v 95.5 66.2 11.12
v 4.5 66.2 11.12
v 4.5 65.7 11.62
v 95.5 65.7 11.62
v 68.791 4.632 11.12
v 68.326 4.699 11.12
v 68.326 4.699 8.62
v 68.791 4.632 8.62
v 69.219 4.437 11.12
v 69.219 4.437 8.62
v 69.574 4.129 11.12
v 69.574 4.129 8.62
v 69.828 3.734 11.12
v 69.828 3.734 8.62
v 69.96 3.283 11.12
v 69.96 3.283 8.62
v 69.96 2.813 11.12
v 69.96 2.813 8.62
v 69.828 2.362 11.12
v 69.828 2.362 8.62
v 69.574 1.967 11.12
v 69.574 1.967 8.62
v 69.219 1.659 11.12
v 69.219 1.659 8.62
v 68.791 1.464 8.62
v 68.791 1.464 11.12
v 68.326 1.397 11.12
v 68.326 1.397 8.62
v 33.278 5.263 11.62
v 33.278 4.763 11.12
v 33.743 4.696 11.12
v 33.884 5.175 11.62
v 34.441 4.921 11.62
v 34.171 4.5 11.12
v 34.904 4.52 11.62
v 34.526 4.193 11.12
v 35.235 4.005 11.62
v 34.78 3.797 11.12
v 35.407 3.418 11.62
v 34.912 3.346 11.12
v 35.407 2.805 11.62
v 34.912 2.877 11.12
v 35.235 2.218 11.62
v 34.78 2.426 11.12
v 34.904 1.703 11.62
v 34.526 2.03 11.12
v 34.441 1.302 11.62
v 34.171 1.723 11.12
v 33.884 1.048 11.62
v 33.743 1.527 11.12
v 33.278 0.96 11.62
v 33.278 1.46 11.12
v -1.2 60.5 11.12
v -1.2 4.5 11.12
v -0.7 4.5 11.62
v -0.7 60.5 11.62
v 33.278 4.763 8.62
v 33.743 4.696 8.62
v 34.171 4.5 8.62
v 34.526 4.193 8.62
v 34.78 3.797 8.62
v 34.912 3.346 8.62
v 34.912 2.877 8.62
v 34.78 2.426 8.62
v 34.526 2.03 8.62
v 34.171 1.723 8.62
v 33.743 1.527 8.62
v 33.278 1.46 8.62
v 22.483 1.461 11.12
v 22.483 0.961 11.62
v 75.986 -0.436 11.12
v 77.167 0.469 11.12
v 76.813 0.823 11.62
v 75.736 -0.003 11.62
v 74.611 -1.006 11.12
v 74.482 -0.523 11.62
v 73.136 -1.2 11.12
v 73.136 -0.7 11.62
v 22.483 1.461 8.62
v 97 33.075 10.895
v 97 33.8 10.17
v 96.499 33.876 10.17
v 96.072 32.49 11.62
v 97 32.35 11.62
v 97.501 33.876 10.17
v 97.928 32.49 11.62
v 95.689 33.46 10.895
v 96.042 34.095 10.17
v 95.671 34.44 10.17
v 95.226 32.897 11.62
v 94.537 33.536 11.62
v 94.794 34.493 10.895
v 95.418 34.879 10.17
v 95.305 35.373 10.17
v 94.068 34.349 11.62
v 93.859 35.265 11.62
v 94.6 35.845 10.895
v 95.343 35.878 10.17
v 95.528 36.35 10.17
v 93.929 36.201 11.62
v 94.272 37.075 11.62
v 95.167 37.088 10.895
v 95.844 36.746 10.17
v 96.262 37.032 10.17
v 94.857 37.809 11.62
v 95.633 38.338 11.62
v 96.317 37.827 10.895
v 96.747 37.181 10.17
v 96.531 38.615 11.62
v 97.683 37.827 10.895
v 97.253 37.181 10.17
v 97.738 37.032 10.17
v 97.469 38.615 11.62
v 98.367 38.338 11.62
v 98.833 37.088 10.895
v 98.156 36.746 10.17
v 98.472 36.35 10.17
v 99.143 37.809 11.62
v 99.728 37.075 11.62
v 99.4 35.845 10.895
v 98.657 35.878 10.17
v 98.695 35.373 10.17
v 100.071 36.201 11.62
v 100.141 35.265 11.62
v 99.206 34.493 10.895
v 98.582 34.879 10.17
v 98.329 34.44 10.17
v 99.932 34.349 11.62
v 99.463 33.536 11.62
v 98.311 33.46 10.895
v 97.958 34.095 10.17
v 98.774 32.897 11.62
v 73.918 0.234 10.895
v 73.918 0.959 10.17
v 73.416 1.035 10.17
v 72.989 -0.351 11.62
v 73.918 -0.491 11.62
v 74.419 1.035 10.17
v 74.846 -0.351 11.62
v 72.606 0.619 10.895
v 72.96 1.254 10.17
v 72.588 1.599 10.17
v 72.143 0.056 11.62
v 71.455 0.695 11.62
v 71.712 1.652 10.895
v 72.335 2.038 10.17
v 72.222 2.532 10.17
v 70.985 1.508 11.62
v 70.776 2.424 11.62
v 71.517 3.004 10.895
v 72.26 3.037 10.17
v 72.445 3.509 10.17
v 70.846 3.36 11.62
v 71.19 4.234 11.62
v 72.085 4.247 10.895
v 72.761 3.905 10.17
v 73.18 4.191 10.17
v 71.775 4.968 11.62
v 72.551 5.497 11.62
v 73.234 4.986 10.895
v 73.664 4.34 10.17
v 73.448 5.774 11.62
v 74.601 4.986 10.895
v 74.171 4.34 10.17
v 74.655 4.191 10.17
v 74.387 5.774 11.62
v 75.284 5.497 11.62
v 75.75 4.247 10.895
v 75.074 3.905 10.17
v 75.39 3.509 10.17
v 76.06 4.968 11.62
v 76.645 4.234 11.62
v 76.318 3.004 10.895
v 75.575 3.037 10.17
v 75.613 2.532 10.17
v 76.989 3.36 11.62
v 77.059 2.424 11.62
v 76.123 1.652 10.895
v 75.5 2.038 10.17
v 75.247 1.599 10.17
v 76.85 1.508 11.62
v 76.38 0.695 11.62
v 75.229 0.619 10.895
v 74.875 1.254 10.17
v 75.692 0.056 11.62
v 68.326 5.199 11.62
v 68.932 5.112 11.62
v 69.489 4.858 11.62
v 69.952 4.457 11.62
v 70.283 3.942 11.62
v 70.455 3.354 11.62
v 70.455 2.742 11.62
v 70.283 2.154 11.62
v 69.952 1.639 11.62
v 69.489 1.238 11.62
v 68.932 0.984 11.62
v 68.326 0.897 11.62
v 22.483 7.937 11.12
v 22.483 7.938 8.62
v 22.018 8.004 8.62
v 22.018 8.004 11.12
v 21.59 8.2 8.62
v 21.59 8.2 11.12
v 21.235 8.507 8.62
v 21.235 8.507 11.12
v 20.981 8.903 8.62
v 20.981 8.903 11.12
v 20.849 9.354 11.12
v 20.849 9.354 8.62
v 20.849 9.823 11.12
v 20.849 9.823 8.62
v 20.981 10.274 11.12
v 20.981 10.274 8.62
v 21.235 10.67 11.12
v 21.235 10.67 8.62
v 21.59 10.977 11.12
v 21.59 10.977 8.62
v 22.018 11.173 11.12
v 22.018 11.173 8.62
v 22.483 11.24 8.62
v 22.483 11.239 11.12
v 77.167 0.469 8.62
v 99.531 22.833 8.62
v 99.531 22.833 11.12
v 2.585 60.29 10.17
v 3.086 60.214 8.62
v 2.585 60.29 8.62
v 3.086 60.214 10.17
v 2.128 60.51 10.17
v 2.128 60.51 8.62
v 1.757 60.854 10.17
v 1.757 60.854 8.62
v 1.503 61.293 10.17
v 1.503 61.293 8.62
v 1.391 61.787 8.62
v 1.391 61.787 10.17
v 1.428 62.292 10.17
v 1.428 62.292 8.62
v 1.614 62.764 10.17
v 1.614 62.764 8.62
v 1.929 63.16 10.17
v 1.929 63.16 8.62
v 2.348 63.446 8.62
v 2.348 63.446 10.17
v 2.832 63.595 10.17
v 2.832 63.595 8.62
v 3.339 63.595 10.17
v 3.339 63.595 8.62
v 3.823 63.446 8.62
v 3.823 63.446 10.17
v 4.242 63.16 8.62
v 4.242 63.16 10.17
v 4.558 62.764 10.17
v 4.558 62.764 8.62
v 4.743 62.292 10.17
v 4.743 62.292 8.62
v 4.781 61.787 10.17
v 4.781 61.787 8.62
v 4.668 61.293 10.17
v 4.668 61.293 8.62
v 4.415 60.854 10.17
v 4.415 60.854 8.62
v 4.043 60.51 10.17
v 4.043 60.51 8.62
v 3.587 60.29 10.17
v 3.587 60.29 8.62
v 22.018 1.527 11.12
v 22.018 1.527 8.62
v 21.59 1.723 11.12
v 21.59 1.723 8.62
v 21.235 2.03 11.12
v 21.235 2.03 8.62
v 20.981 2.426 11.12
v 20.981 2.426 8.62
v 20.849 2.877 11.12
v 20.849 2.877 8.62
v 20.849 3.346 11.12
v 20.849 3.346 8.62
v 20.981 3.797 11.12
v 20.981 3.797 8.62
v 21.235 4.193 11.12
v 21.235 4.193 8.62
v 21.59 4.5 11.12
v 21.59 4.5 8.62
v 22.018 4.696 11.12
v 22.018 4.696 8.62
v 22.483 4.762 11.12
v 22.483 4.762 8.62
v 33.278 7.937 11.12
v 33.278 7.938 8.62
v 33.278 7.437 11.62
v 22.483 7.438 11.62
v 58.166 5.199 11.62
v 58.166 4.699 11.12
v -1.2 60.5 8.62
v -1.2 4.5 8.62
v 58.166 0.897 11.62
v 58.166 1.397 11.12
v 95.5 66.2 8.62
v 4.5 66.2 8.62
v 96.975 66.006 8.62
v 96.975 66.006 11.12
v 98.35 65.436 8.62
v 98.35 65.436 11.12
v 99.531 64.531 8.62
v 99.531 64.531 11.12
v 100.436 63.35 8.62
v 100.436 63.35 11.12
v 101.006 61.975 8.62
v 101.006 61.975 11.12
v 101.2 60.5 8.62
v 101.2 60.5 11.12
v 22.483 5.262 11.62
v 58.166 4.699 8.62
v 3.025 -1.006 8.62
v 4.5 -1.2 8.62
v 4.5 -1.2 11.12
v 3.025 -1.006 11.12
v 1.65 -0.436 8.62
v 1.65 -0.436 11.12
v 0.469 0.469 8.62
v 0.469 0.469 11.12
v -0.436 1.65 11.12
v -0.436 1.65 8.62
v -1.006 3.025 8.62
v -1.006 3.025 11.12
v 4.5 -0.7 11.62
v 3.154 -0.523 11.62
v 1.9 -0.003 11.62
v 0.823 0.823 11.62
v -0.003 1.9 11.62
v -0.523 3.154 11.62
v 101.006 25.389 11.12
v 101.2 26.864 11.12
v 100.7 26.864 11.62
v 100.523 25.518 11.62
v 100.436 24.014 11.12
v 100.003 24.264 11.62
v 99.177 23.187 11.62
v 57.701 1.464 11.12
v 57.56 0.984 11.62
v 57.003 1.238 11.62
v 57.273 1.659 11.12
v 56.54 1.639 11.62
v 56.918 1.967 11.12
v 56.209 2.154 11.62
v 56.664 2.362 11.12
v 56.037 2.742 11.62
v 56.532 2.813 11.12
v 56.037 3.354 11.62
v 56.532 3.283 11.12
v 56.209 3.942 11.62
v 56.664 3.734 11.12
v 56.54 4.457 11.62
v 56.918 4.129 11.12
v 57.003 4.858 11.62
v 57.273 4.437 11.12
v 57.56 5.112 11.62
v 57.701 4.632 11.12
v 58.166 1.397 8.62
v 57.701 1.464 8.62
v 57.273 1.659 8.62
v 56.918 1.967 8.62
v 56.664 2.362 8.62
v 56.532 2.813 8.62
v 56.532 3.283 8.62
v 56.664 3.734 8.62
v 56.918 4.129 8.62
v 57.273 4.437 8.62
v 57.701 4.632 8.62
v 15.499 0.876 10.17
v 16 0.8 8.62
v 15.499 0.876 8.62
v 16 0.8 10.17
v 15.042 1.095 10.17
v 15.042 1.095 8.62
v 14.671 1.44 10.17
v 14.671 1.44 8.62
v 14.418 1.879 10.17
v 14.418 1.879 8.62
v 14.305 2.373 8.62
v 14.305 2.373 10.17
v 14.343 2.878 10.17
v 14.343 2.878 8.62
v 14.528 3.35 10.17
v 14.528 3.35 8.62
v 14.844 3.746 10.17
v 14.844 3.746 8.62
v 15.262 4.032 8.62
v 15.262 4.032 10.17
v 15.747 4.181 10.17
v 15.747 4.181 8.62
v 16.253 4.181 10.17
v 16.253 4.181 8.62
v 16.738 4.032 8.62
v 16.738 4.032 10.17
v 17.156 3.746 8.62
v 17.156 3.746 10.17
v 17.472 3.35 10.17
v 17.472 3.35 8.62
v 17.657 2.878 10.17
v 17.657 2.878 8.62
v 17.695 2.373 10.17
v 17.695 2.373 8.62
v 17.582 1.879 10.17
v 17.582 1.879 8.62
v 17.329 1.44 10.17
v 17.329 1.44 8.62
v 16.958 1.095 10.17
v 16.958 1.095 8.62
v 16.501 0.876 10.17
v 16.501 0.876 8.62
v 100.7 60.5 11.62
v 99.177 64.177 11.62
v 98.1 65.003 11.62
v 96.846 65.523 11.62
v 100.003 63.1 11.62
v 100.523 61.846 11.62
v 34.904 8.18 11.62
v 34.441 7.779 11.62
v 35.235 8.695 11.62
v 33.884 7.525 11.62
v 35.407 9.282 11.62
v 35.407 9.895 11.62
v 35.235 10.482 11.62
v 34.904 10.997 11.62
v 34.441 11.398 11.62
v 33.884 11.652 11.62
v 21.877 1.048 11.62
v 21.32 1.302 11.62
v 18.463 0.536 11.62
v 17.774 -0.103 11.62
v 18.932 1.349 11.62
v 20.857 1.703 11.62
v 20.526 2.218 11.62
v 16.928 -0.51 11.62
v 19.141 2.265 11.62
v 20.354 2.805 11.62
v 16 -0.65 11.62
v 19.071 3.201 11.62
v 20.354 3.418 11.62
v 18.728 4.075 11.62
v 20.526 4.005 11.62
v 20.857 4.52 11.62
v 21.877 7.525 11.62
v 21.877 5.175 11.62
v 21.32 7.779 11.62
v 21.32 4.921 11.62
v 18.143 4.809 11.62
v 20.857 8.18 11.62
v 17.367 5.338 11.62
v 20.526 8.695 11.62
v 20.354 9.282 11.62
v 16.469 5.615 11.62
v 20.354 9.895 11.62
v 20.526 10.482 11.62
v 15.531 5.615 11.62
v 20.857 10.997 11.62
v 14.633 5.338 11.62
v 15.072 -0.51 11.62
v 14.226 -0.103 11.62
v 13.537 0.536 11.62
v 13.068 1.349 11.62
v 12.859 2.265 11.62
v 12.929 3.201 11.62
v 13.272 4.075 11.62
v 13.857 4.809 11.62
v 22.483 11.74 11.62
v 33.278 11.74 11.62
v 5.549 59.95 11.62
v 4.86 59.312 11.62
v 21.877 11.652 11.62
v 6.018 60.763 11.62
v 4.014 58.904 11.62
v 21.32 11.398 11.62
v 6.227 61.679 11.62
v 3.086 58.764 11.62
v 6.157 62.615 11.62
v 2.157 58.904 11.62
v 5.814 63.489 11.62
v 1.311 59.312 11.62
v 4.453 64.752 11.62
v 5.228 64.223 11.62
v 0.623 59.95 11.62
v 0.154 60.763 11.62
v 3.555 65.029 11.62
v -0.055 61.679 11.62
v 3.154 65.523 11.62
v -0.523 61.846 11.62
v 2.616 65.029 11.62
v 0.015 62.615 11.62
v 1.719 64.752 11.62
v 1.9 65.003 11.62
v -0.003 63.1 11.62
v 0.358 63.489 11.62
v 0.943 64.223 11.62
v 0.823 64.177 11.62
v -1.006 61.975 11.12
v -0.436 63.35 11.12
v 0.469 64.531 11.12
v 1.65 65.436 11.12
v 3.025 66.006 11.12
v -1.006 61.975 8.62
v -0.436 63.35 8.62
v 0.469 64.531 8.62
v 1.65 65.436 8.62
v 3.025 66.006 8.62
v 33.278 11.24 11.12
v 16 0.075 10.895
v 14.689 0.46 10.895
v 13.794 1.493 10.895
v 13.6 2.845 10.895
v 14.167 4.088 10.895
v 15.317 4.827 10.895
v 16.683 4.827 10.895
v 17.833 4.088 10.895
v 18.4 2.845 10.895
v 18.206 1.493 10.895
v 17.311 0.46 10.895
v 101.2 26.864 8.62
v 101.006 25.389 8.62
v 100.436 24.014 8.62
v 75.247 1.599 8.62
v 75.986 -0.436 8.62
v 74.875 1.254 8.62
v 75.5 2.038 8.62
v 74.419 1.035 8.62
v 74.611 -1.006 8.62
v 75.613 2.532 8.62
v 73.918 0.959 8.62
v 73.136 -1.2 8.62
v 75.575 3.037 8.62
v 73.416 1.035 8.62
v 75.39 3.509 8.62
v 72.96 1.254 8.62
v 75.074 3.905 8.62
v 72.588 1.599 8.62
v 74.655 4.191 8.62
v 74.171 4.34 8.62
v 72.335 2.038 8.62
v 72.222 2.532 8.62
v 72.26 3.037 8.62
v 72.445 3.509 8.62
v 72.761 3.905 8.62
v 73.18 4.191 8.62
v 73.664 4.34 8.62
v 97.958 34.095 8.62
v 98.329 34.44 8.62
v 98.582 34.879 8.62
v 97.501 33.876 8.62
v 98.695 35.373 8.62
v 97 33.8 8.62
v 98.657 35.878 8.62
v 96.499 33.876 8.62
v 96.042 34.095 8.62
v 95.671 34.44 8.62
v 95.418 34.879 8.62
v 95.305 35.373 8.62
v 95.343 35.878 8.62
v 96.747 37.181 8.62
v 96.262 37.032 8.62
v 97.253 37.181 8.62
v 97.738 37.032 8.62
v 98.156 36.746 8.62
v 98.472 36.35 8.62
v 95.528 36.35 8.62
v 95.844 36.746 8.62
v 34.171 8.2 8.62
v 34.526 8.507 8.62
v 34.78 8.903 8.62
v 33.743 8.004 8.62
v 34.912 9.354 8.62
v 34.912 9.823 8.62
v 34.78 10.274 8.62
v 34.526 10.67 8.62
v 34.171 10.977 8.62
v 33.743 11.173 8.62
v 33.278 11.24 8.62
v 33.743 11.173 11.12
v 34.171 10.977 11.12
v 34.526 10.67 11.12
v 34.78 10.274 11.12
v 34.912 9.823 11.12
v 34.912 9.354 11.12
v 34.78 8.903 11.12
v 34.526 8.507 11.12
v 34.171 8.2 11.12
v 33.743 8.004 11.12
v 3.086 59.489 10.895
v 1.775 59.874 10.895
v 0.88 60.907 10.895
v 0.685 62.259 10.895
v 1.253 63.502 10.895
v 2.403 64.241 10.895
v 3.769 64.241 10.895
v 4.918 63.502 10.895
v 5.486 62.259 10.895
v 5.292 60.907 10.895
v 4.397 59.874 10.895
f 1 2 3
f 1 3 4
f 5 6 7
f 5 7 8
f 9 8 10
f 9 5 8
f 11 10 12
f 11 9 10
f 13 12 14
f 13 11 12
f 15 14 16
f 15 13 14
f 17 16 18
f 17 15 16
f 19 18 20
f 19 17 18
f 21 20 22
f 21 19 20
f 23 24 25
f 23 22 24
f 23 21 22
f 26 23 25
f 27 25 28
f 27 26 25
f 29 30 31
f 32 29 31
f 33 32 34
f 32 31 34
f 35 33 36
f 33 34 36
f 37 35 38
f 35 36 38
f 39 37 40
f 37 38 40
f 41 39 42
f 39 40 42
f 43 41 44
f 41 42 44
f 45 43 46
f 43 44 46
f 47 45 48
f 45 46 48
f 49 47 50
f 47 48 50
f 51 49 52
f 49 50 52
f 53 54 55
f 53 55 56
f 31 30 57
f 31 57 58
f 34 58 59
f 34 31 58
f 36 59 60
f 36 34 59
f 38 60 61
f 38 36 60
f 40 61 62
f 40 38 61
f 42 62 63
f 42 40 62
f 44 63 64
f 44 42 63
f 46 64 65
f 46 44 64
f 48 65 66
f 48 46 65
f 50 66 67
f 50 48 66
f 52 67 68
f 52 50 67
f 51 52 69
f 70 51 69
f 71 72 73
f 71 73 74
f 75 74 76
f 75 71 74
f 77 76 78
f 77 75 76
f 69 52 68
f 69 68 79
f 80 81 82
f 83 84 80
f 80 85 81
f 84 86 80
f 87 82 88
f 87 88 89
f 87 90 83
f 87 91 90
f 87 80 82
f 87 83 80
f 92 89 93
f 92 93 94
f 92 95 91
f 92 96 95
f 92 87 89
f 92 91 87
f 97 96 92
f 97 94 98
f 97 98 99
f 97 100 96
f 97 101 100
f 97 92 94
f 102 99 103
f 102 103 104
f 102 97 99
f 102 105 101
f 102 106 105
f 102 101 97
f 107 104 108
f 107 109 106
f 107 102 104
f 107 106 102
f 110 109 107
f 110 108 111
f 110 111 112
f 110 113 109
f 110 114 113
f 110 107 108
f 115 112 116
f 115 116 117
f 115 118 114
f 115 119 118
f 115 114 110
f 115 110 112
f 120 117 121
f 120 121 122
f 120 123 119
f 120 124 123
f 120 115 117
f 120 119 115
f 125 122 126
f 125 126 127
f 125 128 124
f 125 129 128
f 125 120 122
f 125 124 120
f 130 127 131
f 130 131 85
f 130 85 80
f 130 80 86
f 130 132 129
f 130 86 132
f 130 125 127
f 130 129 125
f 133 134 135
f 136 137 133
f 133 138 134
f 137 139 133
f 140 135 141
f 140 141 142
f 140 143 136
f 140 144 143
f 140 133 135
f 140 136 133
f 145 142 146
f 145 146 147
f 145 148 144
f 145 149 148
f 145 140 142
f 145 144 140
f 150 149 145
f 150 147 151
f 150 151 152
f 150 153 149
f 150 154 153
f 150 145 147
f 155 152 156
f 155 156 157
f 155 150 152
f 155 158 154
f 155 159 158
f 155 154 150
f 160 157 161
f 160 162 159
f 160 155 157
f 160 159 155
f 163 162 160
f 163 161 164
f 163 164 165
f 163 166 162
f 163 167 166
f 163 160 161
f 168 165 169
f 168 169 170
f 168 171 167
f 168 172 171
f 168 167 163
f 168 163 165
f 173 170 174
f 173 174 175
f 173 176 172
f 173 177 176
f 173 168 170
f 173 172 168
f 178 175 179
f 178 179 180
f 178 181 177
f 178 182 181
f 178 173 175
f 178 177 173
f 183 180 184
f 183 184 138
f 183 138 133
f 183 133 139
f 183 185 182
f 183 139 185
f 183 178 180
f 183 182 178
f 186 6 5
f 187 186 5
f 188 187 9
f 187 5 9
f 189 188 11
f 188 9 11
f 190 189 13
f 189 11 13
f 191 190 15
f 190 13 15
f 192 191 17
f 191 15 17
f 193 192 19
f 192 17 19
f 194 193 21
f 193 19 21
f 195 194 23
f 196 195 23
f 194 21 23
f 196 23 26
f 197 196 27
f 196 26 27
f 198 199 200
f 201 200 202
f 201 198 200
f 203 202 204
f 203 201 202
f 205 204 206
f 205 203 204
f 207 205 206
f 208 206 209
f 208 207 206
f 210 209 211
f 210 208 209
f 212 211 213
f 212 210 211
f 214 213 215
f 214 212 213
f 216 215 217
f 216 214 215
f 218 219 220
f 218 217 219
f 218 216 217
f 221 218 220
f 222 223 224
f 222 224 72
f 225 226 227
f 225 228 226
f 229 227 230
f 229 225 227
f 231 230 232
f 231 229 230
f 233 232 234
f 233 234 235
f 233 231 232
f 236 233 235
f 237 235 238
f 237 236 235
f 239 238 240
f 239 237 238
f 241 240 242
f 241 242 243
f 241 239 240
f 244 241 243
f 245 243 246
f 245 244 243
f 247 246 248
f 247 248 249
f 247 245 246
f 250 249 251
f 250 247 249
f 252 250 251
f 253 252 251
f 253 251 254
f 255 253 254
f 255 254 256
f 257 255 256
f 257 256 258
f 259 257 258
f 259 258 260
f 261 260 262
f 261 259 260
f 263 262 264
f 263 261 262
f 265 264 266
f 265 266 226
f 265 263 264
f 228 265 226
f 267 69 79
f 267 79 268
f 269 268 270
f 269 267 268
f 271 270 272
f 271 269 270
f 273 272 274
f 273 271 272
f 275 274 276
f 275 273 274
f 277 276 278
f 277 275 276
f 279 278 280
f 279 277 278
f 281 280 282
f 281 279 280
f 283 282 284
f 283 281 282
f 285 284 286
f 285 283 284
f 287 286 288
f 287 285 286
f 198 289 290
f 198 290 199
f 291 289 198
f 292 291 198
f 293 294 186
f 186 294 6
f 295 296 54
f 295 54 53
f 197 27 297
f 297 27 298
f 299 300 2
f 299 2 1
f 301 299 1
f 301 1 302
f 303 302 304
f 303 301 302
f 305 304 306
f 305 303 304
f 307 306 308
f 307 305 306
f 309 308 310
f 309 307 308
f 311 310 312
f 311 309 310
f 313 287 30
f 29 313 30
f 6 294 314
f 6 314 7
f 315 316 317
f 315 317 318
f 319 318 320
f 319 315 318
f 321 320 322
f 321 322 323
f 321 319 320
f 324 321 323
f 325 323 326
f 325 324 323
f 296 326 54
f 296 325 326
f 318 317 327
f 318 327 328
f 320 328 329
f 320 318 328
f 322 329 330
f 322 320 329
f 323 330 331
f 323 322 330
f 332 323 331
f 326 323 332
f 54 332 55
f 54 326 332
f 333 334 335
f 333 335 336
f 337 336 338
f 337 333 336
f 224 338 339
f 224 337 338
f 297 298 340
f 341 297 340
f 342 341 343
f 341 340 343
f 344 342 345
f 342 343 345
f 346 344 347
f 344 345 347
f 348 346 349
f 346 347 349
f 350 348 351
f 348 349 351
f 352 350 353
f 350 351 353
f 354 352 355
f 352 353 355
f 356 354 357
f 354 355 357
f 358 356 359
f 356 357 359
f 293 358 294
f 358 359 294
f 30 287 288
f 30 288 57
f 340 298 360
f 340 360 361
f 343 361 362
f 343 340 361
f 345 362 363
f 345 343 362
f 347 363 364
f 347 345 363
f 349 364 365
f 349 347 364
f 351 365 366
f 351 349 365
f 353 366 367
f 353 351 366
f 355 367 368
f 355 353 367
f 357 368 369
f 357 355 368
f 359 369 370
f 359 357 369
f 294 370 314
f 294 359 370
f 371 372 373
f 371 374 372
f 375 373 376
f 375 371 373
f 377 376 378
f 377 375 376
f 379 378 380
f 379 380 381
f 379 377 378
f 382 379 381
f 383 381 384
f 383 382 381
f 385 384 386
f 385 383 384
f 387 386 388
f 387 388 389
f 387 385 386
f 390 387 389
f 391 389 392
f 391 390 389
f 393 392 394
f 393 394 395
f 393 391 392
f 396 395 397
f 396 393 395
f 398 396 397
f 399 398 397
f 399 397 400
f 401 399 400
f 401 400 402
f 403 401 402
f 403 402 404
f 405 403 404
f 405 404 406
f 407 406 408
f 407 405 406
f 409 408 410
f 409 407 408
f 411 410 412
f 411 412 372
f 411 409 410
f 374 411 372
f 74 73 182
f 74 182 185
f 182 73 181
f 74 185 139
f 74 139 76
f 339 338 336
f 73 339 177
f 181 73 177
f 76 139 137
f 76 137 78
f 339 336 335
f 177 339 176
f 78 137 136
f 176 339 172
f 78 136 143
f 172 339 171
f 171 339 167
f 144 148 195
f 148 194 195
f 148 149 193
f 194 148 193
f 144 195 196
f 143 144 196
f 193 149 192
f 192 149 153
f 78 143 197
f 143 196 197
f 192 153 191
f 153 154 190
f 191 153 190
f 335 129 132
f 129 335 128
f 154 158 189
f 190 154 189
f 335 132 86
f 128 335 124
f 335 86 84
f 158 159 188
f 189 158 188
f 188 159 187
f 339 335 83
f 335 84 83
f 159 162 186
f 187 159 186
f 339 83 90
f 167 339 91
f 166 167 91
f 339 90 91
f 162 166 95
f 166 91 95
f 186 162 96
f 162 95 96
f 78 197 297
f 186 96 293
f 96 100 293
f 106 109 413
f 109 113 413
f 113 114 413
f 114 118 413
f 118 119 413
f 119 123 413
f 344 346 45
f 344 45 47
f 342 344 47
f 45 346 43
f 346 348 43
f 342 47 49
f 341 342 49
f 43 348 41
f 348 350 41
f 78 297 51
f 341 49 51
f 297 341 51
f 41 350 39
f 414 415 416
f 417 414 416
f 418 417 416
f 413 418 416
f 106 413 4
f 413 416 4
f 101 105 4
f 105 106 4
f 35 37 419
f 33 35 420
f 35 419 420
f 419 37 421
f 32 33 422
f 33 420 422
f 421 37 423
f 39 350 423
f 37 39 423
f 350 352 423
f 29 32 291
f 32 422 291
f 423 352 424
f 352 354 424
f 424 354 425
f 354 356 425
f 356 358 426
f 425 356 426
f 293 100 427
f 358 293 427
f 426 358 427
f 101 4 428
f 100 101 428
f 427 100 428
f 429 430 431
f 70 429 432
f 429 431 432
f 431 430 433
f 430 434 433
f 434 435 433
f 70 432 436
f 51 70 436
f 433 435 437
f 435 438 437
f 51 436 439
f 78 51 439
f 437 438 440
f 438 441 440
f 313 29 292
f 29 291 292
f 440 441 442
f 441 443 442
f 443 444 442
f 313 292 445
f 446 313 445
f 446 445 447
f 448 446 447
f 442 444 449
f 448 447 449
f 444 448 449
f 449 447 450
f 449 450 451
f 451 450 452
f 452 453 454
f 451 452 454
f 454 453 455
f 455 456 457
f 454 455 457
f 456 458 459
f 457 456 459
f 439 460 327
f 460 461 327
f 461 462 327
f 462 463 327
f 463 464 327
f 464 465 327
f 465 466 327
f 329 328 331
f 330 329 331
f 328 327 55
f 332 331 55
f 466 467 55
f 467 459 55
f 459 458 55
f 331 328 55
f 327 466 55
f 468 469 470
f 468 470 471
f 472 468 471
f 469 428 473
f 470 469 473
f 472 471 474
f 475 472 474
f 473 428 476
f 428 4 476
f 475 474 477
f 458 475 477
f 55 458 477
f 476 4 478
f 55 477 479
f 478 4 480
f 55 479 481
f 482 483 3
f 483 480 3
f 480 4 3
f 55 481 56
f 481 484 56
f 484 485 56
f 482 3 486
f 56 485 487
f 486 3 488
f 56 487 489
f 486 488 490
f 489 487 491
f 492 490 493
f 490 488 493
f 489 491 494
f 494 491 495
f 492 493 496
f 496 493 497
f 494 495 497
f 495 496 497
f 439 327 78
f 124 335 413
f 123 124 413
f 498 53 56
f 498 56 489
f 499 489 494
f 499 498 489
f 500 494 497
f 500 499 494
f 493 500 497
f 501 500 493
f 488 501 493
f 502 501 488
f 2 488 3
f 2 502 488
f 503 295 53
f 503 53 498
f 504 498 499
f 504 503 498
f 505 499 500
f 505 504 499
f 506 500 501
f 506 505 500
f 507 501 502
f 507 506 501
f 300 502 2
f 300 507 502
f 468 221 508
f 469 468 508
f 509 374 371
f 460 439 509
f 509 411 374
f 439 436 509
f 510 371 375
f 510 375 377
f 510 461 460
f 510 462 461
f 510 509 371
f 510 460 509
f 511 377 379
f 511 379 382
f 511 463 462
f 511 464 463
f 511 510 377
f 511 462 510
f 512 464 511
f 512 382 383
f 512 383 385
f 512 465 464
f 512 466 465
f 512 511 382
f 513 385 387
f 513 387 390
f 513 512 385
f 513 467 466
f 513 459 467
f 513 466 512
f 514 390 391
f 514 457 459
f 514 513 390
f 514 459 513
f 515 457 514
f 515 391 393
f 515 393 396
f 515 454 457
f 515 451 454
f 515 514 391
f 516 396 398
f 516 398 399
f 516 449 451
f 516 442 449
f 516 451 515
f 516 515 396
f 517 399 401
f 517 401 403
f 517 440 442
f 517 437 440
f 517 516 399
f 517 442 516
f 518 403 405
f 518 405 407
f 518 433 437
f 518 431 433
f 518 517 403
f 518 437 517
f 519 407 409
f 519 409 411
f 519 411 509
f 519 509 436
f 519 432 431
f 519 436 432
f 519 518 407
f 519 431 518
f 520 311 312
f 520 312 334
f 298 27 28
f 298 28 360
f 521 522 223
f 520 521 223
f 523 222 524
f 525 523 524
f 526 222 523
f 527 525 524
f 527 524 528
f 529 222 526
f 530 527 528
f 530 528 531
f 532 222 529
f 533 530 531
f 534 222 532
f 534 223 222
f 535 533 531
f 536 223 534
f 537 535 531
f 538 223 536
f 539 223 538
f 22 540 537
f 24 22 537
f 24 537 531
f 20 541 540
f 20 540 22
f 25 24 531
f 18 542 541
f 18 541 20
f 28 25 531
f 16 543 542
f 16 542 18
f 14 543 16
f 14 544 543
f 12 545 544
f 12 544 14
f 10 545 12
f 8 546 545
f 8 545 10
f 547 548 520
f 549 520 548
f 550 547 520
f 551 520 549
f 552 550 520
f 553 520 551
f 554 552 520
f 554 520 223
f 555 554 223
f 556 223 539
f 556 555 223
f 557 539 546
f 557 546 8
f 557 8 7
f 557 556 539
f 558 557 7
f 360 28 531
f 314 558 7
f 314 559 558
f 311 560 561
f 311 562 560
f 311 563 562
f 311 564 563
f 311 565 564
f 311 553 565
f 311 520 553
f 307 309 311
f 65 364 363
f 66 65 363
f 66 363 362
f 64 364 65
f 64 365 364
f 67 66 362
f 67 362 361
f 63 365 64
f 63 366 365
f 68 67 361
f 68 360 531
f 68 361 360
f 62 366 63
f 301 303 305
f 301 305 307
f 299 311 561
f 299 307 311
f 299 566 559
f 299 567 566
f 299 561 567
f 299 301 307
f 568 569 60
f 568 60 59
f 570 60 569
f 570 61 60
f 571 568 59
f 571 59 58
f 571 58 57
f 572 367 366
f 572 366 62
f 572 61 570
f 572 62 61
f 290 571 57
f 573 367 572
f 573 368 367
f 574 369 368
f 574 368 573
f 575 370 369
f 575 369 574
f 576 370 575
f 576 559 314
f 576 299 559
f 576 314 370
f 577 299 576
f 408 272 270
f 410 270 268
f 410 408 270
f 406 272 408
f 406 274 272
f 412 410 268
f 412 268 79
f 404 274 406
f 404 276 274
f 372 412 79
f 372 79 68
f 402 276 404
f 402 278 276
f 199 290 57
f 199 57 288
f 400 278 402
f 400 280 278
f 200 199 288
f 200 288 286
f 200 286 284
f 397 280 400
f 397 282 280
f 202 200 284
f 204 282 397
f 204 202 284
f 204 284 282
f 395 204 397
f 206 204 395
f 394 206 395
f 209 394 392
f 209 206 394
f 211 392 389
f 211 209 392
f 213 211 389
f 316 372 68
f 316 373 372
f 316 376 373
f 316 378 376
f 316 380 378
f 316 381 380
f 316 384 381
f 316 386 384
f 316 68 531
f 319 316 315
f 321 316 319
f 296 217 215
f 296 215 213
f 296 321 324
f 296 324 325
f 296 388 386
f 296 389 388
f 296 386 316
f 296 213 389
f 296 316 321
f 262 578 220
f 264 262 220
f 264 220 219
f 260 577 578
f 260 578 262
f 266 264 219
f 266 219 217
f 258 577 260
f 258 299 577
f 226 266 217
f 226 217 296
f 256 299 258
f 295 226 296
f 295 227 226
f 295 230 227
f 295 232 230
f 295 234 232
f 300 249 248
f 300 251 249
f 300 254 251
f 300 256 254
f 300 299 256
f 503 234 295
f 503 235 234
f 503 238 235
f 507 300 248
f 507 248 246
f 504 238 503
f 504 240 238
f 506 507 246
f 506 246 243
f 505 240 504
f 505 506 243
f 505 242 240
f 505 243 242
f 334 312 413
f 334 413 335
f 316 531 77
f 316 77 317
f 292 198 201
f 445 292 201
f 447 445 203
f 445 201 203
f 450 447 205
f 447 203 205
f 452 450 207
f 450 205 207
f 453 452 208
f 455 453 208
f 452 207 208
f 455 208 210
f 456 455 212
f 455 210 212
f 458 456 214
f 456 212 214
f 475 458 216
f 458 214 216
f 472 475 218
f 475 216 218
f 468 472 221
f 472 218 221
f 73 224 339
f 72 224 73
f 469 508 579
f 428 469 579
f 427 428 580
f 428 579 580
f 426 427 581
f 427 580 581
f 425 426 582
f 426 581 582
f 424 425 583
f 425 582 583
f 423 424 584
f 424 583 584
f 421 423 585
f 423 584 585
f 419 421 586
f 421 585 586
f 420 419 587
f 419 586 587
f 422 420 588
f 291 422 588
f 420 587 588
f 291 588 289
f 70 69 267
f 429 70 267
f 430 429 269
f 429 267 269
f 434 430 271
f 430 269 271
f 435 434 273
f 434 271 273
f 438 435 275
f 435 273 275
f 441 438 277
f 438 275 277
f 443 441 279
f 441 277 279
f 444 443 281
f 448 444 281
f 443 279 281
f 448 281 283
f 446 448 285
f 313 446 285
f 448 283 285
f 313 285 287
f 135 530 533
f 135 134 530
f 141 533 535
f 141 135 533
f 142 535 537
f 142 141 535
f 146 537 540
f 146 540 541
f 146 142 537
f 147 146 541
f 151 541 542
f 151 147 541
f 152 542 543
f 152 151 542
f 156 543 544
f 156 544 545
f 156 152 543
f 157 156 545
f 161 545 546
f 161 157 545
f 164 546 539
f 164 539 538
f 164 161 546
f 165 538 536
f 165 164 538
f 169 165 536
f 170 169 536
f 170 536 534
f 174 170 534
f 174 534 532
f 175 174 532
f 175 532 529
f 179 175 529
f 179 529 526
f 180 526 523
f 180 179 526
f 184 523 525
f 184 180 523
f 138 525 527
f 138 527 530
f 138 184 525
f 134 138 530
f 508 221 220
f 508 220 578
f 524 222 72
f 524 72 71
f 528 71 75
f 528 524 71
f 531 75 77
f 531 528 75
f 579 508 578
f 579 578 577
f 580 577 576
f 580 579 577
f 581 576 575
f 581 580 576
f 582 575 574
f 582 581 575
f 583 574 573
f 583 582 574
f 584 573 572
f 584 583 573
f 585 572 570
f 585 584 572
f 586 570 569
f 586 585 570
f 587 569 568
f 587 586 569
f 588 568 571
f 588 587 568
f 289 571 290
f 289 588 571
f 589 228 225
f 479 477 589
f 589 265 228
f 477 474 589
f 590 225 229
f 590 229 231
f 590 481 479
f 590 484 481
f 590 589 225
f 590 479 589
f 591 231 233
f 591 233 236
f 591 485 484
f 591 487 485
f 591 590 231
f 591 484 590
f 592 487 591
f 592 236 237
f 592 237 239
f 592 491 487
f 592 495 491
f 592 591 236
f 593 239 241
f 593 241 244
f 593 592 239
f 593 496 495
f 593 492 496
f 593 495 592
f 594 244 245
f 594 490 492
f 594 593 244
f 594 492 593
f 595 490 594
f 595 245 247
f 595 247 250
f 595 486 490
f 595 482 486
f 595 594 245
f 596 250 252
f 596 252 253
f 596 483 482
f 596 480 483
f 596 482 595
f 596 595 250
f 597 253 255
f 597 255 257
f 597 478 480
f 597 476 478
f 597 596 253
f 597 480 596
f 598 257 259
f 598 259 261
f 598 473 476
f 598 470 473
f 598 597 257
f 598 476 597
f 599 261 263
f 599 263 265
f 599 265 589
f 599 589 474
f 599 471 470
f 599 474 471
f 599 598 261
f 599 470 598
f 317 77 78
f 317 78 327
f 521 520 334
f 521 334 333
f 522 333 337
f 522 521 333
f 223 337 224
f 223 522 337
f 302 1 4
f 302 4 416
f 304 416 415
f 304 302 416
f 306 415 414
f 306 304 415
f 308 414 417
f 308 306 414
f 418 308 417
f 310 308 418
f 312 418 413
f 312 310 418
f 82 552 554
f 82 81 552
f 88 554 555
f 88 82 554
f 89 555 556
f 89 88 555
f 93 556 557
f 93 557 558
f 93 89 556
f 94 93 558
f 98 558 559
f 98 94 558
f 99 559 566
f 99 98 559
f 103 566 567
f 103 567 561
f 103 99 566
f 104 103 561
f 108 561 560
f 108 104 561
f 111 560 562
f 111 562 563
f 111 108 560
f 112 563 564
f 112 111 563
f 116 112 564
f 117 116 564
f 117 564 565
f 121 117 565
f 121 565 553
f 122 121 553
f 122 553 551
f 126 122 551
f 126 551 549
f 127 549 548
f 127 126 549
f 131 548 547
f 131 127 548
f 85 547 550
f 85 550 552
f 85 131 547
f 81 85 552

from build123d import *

# Parameters (mm, degrees)
BOSS_EXTRUDE1_DEPTH                            = 3
CSK_FOR_M3_FLAT_HEAD_MACHINE_SCREW1_AT_2_COUNT = 2
CSK_FOR_M3_FLAT_HEAD_MACHINE_SCREW1_AT_2_PITCH = 60.801526997
CSK_FOR_M3_FLAT_HEAD_MACHINE_SCREW1_AT_3_COUNT = 2
CSK_FOR_M3_FLAT_HEAD_MACHINE_SCREW1_AT_3_PITCH = 92.34886737
CSK_FOR_M3_FLAT_HEAD_MACHINE_SCREW1_AT_4_COUNT = 2
CSK_FOR_M3_FLAT_HEAD_MACHINE_SCREW1_AT_4_PITCH = 97.558137473
CUT_EXTRUDE1_DEPTH                             = 4
CHAMFER1_SIZE                                  = 0.5


with BuildPart() as part:
    # Sketch2 → Boss-Extrude1 (new body)
    with BuildSketch(Plane.XY.offset(8.62)):
        with BuildLine():
            Line((4.5, 66.2), (95.5, 66.2))
            ThreePointArc((95.5, 66.2), (99.530508653, 64.530508653), (101.2, 60.5))
            Line((101.2, 60.5), (101.2, 26.863961031))
            ThreePointArc((101.2, 26.863961031), (100.766113335, 24.682665466), (99.530508653, 22.833452378))
            Line((99.530508653, 22.833452378), (77.166547622, 0.469491347))
            ThreePointArc((77.166547622, 0.469491347), (75.317334534, -0.766113335), (73.136038969, -1.2))
            Line((73.136038969, -1.2), (4.5, -1.2))
            ThreePointArc((4.5, -1.2), (0.469491347, 0.469491347), (-1.2, 4.5))
            Line((-1.2, 4.5), (-1.2, 60.5))
            ThreePointArc((-1.2, 60.5), (0.469491347, 64.530508653), (4.5, 66.2))
        make_face()
    extrude(amount=BOSS_EXTRUDE1_DEPTH)

    # Sketch5 → CSK for M3 Flat Head Machine Screw1 (revolve, cut)
    with BuildSketch(Plane(origin=(3.085786438, 61.914213562, 11.62), x_dir=(0, -1, 0), z_dir=(1, 0, 0))):
        Polygon((0, 0), (0, 3), (1.7, 3), (1.7, 1.45), (3.15, 0), align=None)
    csk_for_m3_flat_head_machine_screw1 = revolve(axis=Axis((3.085786438, 61.914213562, 17.97), (0, 0, -1)), mode=Mode.SUBTRACT)

    # CSK for M3 Flat Head Machine Screw1 at 2: CSK for M3 Flat Head Machine Screw1 ×2
    with Locations(*[Vector(0.212399494, -0.977182918, 0) * (i * CSK_FOR_M3_FLAT_HEAD_MACHINE_SCREW1_AT_2_PITCH) for i in range(1, CSK_FOR_M3_FLAT_HEAD_MACHINE_SCREW1_AT_2_COUNT)]):
        add(csk_for_m3_flat_head_machine_screw1, mode=Mode.SUBTRACT)

    # CSK for M3 Flat Head Machine Screw1 at 3: CSK for M3 Flat Head Machine Screw1 ×2
    with Locations(*[Vector(0.767001446, -0.641645371, 0) * (i * CSK_FOR_M3_FLAT_HEAD_MACHINE_SCREW1_AT_3_PITCH) for i in range(1, CSK_FOR_M3_FLAT_HEAD_MACHINE_SCREW1_AT_3_COUNT)]):
        add(csk_for_m3_flat_head_machine_screw1, mode=Mode.SUBTRACT)

    # CSK for M3 Flat Head Machine Screw1 at 4: CSK for M3 Flat Head Machine Screw1 ×2
    with Locations(*[Vector(0.962648693, -0.270753565, 0) * (i * CSK_FOR_M3_FLAT_HEAD_MACHINE_SCREW1_AT_4_PITCH) for i in range(1, CSK_FOR_M3_FLAT_HEAD_MACHINE_SCREW1_AT_4_COUNT)]):
        add(csk_for_m3_flat_head_machine_screw1, mode=Mode.SUBTRACT)

    # Sketch6 → Cut-Extrude1 (cut, through all)
    with BuildSketch(Plane.XY.offset(11.62)):
        with BuildLine():
            Line((33.278, 7.9375), (22.483, 7.9375))
            ThreePointArc((22.483, 7.9375), (20.832, 9.5885), (22.483, 11.2395))
            Line((22.483, 11.2395), (33.278, 11.2395))
            ThreePointArc((33.278, 11.2395), (34.929, 9.5885), (33.278, 7.9375))
        make_face()
        with BuildLine():
            Line((33.278, 1.4605), (22.483, 1.4605))
            ThreePointArc((22.483, 1.4605), (20.832, 3.1115), (22.483, 4.7625))
            Line((22.483, 4.7625), (33.278, 4.7625))
            ThreePointArc((33.278, 4.7625), (34.929, 3.1115), (33.278, 1.4605))
        make_face()
        with BuildLine():
            Line((68.326, 1.397), (58.166, 1.397))
            ThreePointArc((58.166, 1.397), (56.515, 3.048), (58.166, 4.699))
            Line((58.166, 4.699), (68.326, 4.699))
            ThreePointArc((68.326, 4.699), (69.977, 3.048), (68.326, 1.397))
        make_face()
    extrude(amount=-CUT_EXTRUDE1_DEPTH, mode=Mode.SUBTRACT)

    # Chamfer1
    chamfer1_edges = [part.edges().sort_by_distance(p)[0] for p in [
        (75.317334534, -0.766113335, 11.62),
        (88.348528137, 11.651471863, 11.62),
        (100.766113335, 24.682665466, 11.62),
        (101.2, 43.681980515, 11.62),
        (99.530508653, 64.530508653, 11.62),
        (50, 66.2, 11.62),
        (0.469491347, 64.530508653, 11.62),
        (-1.2, 32.5, 11.62),
        (0.469491347, 0.469491347, 11.62),
        (34.929, 9.5885, 11.62),
        (27.8805, 11.2395, 11.62),
        (20.832, 9.5885, 11.62),
        (27.8805, 7.9375, 11.62),
        (38.818019485, -1.2, 11.62),
        (34.929, 3.1115, 11.62),
        (27.8805, 4.7625, 11.62),
        (20.832, 3.1115, 11.62),
        (27.8805, 1.4605, 11.62),
        (69.977, 3.048, 11.62),
        (63.246, 4.699, 11.62),
        (56.515, 3.048, 11.62),
        (63.246, 1.397, 11.62),
    ]]
    chamfer(chamfer1_edges, length=CHAMFER1_SIZE)


solid = part.part
